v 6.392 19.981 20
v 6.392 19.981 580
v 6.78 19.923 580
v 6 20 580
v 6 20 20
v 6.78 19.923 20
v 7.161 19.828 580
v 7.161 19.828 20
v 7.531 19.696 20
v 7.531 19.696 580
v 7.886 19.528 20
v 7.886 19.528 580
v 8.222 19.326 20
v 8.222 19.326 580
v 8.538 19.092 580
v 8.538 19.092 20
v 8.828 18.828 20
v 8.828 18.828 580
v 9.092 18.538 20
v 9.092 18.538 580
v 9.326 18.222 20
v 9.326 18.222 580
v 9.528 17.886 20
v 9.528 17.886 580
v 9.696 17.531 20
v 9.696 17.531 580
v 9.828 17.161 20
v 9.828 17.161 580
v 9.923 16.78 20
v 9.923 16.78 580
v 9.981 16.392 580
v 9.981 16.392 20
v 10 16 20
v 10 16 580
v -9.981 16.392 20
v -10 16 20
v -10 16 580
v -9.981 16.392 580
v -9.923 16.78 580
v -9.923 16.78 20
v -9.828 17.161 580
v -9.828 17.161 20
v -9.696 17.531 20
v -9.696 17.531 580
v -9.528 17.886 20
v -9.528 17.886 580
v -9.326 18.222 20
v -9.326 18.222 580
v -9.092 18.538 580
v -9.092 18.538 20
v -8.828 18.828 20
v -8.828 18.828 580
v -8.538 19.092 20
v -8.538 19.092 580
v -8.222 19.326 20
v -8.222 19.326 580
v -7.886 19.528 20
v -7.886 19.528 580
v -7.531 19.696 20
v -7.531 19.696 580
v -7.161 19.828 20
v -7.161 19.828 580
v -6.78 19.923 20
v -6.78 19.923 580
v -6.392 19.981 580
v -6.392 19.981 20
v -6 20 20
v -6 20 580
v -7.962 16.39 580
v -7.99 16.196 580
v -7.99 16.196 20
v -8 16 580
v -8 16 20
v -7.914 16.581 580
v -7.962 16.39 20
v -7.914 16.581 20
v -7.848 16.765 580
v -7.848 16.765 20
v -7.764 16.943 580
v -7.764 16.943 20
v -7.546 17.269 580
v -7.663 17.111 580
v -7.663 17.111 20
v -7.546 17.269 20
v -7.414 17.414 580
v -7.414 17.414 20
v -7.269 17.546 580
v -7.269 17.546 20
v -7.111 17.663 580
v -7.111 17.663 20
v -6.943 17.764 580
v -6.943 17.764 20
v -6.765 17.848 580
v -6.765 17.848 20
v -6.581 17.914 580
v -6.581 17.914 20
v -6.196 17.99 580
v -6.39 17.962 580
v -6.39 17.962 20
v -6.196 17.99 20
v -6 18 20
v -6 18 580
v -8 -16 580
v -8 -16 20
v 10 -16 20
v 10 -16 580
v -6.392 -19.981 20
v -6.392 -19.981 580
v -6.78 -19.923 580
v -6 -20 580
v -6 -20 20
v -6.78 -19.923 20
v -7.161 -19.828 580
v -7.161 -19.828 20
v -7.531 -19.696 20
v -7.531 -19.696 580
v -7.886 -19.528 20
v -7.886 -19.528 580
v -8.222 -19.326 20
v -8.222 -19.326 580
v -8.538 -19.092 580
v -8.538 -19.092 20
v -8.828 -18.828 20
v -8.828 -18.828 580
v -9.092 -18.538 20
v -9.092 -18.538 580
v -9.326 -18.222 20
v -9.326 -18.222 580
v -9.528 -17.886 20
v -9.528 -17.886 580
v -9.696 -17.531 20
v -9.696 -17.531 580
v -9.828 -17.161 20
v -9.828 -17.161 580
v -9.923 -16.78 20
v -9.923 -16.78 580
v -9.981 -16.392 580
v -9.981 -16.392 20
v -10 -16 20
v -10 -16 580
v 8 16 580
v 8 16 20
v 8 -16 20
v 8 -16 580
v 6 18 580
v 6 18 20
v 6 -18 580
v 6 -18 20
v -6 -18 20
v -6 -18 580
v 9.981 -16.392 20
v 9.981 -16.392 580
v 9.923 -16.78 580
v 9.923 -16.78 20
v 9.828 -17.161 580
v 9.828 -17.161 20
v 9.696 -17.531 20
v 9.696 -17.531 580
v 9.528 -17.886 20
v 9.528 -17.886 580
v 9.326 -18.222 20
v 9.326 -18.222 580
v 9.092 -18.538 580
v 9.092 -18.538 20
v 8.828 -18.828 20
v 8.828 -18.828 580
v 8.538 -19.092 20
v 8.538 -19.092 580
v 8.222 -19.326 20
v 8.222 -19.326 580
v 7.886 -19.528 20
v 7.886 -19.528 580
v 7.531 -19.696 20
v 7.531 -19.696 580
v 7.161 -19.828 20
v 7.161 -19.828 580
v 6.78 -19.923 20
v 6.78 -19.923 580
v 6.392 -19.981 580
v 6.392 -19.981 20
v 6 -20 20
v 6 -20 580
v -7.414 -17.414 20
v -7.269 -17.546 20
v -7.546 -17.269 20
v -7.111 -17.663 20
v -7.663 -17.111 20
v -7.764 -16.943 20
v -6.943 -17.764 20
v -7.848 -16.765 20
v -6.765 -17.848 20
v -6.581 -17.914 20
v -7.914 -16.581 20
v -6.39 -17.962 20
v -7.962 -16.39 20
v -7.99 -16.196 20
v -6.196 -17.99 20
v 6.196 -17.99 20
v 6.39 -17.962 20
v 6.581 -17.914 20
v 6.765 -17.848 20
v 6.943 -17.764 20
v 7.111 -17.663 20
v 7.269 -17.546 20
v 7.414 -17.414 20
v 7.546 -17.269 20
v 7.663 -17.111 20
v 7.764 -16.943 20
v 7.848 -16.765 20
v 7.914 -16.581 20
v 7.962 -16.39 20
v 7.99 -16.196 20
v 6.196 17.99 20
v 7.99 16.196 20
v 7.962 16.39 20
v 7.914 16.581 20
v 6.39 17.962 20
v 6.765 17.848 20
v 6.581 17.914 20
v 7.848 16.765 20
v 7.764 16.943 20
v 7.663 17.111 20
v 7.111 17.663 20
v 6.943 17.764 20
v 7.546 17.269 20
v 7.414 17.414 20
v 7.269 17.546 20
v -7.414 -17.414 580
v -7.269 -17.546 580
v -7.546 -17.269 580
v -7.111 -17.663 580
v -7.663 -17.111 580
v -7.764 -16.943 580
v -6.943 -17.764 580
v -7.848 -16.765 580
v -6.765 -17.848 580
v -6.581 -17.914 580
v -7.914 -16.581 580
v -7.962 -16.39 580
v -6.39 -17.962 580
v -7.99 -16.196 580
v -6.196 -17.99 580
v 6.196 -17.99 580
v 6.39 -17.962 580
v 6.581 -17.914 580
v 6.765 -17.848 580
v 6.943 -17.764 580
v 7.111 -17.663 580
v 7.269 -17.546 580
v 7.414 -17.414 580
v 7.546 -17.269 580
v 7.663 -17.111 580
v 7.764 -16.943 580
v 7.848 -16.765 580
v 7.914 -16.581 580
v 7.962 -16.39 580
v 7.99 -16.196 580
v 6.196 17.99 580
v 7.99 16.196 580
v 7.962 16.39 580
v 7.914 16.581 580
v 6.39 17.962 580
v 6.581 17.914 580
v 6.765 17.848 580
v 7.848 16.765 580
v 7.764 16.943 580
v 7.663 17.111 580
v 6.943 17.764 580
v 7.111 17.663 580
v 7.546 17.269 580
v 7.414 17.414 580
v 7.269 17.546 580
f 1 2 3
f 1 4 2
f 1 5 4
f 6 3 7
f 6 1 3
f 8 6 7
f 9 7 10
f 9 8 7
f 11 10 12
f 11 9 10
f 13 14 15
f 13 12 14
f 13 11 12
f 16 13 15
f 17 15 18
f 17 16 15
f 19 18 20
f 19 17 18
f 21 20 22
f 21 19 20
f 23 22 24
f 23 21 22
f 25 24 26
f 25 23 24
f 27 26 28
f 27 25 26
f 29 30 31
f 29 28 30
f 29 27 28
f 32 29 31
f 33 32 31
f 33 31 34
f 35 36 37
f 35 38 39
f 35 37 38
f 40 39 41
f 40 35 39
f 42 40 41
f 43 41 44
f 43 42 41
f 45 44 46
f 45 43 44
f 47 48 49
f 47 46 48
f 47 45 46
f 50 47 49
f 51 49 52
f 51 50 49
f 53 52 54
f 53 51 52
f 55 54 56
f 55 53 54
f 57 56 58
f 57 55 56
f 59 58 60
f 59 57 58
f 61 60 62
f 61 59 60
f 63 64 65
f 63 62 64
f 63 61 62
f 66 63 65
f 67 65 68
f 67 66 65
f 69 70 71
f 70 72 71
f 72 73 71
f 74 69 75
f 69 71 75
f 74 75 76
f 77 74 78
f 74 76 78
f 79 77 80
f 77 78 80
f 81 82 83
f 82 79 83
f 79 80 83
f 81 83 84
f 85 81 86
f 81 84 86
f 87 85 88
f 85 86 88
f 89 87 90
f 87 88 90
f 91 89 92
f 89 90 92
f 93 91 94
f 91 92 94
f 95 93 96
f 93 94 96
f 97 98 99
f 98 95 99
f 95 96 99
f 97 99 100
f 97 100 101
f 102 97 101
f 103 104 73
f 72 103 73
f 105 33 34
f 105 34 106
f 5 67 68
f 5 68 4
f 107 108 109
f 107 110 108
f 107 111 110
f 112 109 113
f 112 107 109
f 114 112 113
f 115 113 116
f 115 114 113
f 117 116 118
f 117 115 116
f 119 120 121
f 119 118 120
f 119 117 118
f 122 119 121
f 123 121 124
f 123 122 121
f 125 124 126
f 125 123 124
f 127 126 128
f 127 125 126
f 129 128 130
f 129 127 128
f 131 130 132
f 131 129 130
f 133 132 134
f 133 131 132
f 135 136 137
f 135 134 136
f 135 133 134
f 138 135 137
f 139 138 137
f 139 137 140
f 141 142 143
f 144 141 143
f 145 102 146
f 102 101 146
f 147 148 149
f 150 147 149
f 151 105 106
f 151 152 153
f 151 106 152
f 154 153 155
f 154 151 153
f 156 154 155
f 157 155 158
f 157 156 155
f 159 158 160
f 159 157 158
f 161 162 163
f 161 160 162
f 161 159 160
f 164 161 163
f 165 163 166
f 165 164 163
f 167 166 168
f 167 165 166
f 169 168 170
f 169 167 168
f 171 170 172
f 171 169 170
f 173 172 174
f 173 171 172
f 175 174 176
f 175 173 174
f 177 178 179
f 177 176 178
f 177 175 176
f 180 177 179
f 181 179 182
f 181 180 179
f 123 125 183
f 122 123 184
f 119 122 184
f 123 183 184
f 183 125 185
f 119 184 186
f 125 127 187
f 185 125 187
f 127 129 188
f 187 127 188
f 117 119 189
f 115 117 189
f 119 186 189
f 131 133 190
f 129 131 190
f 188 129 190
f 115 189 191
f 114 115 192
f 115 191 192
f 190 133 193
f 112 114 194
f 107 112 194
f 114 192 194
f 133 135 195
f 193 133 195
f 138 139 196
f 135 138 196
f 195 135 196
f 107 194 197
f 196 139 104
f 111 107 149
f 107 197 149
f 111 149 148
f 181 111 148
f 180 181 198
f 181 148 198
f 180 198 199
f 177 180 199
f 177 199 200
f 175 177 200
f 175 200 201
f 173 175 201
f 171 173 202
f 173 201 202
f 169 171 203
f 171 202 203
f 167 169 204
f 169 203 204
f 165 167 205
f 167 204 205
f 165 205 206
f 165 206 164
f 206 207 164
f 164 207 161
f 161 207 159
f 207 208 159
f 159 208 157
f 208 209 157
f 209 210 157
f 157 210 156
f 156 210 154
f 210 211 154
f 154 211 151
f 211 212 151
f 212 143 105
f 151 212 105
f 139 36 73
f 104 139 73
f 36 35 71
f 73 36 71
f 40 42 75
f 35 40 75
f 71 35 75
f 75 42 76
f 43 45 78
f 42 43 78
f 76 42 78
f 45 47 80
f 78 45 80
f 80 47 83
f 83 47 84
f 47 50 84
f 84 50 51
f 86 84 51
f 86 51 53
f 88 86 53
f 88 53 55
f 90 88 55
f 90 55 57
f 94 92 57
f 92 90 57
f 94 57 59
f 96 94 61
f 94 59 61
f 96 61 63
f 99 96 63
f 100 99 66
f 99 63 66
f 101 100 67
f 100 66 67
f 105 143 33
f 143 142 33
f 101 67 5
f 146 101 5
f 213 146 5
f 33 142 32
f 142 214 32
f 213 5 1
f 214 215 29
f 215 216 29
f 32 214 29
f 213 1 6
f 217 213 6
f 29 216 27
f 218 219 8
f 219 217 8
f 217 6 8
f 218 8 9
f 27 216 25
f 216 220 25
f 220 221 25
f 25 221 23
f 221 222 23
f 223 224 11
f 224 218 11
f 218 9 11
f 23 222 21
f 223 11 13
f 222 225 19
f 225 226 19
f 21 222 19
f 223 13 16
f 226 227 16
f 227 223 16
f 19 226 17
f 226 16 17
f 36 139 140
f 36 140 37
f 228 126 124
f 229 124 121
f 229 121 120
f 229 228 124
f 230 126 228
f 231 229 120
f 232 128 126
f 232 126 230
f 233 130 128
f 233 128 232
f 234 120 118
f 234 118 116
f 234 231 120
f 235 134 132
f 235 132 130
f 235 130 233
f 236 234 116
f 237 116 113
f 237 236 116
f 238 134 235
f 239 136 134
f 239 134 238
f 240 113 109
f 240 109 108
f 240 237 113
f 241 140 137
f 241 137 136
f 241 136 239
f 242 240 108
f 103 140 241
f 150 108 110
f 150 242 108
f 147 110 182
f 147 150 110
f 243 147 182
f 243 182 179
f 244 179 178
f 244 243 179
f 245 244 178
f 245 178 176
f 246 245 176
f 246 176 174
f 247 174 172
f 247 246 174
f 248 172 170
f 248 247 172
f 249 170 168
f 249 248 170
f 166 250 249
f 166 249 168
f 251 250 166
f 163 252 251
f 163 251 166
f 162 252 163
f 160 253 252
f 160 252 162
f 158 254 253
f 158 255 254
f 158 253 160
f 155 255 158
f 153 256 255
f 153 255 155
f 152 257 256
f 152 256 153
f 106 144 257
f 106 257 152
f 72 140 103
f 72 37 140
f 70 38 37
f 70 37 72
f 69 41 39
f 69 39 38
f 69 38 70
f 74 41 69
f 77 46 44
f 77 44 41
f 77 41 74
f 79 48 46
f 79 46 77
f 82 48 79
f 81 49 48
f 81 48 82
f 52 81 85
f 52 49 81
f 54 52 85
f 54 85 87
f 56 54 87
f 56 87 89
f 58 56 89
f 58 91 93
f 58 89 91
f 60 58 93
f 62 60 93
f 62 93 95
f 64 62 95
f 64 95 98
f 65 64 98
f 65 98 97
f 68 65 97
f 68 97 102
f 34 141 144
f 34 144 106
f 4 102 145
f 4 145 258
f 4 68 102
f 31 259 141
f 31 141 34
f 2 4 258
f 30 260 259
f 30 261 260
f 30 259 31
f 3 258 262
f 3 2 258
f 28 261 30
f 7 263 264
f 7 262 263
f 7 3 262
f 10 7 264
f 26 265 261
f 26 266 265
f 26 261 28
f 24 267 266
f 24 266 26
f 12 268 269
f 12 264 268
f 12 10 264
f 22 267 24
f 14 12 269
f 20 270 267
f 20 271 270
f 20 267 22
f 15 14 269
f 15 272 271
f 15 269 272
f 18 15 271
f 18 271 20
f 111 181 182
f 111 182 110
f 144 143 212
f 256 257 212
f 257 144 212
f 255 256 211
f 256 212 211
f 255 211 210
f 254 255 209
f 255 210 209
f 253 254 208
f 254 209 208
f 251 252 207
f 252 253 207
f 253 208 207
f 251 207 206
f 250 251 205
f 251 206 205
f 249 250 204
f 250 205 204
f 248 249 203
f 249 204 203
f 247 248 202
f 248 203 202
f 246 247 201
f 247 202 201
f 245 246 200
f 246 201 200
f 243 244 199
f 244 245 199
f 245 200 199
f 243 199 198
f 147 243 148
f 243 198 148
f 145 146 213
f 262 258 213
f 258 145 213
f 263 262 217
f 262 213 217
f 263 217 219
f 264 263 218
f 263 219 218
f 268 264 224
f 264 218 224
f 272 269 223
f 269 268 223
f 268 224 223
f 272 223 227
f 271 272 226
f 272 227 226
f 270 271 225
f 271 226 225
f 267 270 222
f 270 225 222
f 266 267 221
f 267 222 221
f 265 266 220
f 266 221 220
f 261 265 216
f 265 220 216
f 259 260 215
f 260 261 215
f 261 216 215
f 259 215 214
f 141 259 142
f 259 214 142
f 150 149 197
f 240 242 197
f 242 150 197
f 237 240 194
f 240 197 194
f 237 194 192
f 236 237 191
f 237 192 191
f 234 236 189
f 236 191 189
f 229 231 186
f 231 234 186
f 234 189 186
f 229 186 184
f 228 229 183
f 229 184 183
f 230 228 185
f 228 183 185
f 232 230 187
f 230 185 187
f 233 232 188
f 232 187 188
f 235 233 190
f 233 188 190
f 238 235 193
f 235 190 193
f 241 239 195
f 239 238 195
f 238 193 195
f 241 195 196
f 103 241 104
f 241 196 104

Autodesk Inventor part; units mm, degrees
ref_plane "Start Plane" through (0, 0, 20) normal (0, 0, 1) x (1, 0, 0)
ref_plane "End Plane" through (0, 0, 580) normal (0, 0, 1) x (1, 0, 0)
sketch "Sketch" plane through (0, 0, 0) normal (0, 0, 1) x (1, 0, 0)
  line L0 (-10, -16) -> (-10, 16)
  line L1 (-6, 20) -> (6, 20)
  line L2 (10, 16) -> (10, -16)
  line L3 (6, -20) -> (-6, -20)
  arc A0 (-10, -16) -> (-6, -20) centre (-6, -16) ccw
  arc A1 (10, 16) -> (6, 20) centre (6, 16) ccw
  arc A2 (-6, 20) -> (-10, 16) centre (-6, 16) ccw
  arc A3 (6, -20) -> (10, -16) centre (6, -16) ccw
  arc A4 (-6, 18) -> (-8, 16) centre (-6, 16) ccw
  line L4 (-6, 18) -> (6, 18)
  arc A5 (8, 16) -> (6, 18) centre (6, 16) ccw
  line L5 (8, 16) -> (8, -16)
  arc A6 (6, -18) -> (8, -16) centre (6, -16) ccw
  line L6 (6, -18) -> (-6, -18)
  arc A7 (-8, -16) -> (-6, -18) centre (-6, -16) ccw
  line L7 (-8, -16) -> (-8, 16)
  line L8 (0, 29.1598) -> (0, -29.1598) construction
  line L9 (-15.1598, 0) -> (15.1598, 0) construction
  dimension "d7" = 4
  dimension "d9" = 20
  dimension "d11" = 40
  dimension "d12" = 2
  dimension "d15" = 10
  dimension "d16" = 20
extrude "Body" add sketch "Sketch" along normal up to surface (560 mm away) from surface at 20
sketch "Sketch3" plane through (0, 0, 0) normal (0, 0, 1) x (1, 0, 0)
  line L0 (0, 0) -> (10, 0)
ref_plane "Work Plane3" through (0, 0, 0) normal (0, -1, 0) x (1, 0, 0)
ref_plane "Work Plane4" through (-390, 276, 580) normal (0, 0, 1) x (1, 0, 0)
split "Split1" plane through (-390, 276, 580) removes the side toward (0, 0, 1)
ref_plane "Work Plane5" through (-480, 244, 20) normal (0, 0, -1) x (-1, 0, 0)
split "Split2" plane through (-480, 244, 20) removes the side toward (0, 0, -1)
sketch "Sketch4" plane through (0, 0, 0) normal (0, -1, 0) x (1, 0, 0)
  line L0 (-2, 20) -> (12, 20) projected
  line L1 (-2, 580) -> (12, 580) projected
  dimension "d18" = 560
equation "\"d7\" = G_IR"
equation "\"d9\" = G_W"
equation "\"d11\" = G_H"
equation "\"d12\" = G_T"
equation "\"d15\" = 0.5 * d9"
equation "\"d16\" = 0.5 * d11"
equation "\"d3\" = G_L"
equation "\"G_W\" = 20"
equation "\"G_H\" = 40"
equation "\"G_T\" = 2"
equation "\"G_IR\" = 4"
equation "\"G_L\" = d18"
properties part number "ISO 10799-2 - 40x20x2 - 560" material "Steel, Mild"
